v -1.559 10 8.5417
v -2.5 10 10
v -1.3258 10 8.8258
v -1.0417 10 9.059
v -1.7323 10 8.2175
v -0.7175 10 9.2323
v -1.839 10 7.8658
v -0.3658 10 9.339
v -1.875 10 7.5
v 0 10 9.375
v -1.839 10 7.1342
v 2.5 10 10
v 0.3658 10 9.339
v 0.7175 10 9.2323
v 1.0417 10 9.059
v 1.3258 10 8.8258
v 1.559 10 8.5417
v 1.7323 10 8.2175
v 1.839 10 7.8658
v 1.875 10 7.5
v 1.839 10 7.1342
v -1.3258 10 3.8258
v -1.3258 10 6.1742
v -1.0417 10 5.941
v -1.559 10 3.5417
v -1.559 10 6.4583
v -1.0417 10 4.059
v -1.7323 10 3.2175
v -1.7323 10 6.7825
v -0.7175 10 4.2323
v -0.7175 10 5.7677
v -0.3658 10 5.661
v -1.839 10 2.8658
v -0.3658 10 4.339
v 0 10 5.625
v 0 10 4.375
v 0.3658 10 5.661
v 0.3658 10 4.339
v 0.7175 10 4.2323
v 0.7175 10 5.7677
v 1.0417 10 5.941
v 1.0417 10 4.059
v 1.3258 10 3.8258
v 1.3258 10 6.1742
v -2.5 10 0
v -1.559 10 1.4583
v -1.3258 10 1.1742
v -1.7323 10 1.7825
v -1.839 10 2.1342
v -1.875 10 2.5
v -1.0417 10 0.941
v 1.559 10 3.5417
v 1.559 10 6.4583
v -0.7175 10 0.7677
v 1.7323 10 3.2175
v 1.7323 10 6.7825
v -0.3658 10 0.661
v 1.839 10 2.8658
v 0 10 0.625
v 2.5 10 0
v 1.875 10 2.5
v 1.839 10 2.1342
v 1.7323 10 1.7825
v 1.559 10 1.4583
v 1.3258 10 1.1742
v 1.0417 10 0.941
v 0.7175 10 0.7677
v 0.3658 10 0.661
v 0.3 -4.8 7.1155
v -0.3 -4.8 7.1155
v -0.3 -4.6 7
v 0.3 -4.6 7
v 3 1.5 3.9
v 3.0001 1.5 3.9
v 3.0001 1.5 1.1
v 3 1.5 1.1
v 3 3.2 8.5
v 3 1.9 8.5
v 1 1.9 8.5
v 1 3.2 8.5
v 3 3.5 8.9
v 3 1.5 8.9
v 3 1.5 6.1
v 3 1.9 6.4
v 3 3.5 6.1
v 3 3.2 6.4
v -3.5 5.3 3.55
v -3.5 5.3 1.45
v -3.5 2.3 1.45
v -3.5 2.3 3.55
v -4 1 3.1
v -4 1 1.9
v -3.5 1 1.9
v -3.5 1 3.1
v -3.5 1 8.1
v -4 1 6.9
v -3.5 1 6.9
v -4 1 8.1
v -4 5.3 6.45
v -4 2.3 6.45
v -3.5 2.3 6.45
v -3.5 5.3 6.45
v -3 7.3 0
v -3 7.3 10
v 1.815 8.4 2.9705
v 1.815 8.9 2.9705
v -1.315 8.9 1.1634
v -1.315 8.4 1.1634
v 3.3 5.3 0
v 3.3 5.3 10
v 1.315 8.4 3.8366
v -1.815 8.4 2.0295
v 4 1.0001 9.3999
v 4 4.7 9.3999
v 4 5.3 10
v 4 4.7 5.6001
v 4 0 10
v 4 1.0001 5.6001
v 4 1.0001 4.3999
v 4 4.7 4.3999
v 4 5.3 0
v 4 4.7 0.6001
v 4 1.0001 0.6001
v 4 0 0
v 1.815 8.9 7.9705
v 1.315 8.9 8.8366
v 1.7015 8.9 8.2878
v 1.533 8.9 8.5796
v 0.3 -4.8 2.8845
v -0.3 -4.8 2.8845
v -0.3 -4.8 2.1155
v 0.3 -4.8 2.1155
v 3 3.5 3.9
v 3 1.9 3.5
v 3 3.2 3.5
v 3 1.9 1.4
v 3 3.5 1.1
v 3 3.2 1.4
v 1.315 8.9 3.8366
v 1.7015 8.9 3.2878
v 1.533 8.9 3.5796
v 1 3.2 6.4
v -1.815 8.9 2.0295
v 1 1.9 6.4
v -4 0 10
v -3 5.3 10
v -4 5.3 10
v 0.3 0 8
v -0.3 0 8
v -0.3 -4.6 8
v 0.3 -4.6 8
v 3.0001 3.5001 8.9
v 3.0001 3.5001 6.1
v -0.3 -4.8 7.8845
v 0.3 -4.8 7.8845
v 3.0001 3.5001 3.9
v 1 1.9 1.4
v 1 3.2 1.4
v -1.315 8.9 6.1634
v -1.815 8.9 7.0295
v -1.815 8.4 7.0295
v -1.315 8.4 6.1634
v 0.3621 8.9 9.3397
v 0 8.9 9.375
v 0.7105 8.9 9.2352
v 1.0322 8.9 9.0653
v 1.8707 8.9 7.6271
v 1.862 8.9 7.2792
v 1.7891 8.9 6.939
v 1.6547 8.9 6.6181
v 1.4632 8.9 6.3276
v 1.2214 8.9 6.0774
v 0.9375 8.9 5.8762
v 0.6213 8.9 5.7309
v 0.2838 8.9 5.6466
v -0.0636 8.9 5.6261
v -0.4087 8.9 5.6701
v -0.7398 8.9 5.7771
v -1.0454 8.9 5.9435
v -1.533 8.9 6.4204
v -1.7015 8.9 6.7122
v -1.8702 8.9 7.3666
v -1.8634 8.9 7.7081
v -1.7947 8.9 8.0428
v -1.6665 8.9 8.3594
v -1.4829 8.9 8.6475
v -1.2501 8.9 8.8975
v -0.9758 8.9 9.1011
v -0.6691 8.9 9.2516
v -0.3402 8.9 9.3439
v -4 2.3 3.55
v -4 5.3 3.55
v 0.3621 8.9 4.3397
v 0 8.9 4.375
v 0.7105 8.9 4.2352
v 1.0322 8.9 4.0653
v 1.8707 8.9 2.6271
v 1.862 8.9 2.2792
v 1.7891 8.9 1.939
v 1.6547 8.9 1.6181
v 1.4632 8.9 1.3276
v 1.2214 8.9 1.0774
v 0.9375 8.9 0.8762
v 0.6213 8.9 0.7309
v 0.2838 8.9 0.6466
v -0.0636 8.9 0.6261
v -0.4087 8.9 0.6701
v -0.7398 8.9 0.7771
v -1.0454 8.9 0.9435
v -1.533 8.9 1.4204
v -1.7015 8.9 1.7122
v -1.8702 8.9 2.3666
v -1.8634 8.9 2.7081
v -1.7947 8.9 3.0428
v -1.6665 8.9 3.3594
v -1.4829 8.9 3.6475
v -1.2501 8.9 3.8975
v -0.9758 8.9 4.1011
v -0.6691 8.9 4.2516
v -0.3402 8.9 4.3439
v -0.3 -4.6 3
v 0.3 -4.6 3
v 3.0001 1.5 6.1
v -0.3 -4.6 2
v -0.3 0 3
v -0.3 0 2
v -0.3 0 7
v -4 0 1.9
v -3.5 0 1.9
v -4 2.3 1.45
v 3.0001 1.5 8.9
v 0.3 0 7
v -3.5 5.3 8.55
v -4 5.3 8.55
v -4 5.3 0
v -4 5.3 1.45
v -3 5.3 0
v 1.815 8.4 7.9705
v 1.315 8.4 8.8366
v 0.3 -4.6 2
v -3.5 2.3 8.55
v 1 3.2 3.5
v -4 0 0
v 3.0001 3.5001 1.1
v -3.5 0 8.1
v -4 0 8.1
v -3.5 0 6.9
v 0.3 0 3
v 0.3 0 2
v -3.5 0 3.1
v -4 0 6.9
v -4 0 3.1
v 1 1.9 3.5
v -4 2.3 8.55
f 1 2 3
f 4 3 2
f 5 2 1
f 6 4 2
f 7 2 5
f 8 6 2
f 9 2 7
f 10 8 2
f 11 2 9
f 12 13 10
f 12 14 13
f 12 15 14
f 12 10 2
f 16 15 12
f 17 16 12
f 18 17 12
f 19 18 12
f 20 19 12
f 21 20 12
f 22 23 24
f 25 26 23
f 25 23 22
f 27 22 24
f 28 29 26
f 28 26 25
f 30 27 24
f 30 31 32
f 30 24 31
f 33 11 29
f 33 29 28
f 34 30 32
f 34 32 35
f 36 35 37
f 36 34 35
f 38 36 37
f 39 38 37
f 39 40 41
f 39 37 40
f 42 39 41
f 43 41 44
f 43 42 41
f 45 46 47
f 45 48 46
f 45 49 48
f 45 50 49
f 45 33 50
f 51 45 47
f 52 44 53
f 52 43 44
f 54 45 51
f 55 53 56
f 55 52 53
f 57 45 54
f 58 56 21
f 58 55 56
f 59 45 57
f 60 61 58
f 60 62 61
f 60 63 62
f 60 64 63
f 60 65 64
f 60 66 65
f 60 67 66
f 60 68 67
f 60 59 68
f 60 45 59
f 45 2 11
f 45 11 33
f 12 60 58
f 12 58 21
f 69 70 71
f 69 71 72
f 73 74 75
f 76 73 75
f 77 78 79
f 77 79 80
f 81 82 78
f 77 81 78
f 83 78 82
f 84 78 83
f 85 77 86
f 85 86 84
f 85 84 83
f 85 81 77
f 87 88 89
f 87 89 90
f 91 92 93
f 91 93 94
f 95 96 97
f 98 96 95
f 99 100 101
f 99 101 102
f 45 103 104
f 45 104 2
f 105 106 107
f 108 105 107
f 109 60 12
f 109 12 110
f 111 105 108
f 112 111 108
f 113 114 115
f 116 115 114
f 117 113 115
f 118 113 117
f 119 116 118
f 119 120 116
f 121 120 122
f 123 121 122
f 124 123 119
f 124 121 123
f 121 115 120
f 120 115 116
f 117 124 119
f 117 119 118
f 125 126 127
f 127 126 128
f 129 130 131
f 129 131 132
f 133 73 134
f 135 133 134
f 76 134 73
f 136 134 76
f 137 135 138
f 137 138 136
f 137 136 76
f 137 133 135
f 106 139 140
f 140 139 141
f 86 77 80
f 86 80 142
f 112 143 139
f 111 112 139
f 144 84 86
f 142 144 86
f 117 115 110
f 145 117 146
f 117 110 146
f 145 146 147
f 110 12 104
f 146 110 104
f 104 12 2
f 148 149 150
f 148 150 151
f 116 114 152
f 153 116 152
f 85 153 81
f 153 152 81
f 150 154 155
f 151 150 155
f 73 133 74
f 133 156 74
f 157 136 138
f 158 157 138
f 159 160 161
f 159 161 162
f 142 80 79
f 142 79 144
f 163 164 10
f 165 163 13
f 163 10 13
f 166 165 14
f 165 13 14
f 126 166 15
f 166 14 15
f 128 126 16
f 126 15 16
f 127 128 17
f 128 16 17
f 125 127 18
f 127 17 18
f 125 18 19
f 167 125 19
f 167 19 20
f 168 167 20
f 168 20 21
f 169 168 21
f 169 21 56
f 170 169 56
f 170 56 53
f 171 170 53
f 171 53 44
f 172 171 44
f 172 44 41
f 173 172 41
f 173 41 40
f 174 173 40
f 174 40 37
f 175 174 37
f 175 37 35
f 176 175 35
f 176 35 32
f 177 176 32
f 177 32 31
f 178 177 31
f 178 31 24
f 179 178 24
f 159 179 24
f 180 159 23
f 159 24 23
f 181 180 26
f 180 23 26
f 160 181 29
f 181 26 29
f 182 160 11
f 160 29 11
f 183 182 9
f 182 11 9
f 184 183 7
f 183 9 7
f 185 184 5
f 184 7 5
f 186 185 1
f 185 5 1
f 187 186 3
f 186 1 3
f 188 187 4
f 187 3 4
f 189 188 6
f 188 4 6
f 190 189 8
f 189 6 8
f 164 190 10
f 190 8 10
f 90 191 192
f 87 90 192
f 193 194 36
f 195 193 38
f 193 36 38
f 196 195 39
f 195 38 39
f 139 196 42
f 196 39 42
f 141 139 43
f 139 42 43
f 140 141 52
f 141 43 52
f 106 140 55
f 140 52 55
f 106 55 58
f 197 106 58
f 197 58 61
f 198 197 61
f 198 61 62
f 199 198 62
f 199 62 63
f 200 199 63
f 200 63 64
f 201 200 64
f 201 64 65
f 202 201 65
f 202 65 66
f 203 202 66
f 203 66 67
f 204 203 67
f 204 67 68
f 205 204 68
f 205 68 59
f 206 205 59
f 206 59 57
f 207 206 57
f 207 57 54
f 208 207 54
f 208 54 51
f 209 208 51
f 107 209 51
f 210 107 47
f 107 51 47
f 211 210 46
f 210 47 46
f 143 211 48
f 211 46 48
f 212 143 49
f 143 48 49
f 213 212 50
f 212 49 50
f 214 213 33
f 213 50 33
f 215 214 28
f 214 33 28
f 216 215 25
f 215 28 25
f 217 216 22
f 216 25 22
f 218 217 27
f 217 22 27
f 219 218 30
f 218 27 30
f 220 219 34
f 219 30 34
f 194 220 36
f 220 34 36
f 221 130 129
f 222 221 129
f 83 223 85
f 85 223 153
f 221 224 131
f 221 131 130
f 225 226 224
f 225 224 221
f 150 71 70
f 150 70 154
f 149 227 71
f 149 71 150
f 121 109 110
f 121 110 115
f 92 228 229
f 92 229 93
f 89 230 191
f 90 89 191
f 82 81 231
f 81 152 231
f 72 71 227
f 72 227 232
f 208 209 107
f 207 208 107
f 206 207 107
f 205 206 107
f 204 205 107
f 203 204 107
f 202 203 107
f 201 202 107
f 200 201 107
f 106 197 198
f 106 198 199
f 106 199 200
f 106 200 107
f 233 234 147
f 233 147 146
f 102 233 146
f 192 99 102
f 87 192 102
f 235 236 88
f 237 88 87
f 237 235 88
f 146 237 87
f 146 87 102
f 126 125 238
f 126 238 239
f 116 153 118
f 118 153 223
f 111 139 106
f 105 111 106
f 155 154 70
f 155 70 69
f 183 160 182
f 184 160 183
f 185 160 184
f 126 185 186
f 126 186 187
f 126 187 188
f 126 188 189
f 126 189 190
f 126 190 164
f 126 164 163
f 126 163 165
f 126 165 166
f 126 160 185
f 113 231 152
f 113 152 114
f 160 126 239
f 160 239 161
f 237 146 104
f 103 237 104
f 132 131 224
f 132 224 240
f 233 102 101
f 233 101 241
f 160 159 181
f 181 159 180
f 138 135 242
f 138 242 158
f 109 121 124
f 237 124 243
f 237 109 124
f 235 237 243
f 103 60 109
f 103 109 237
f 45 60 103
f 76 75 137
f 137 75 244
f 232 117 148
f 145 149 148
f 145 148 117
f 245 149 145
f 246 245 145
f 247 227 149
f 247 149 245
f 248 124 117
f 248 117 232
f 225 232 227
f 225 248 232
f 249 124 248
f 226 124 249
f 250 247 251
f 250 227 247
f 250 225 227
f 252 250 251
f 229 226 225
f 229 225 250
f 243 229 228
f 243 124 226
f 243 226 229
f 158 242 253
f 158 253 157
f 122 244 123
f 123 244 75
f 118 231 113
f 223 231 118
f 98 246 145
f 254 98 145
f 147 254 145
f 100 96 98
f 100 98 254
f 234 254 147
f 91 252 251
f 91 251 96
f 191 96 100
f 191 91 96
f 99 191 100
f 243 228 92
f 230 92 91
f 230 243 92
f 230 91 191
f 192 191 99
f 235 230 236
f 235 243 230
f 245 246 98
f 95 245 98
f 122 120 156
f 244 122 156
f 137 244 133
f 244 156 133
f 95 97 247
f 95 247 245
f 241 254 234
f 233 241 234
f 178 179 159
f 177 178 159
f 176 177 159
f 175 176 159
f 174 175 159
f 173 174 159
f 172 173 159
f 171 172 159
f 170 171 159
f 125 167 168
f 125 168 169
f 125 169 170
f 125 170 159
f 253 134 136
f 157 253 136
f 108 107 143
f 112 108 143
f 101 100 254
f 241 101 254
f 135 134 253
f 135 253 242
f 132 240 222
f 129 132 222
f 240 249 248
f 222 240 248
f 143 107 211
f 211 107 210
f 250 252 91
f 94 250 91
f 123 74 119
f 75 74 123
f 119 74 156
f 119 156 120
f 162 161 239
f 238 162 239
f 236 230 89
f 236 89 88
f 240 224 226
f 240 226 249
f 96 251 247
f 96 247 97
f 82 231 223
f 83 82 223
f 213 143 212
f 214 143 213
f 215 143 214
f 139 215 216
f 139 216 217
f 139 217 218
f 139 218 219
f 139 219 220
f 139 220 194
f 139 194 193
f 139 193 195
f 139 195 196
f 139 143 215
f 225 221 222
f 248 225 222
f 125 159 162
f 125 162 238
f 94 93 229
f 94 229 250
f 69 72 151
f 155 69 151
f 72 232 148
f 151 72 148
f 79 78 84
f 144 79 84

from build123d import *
from OCP.BRepFilletAPI import BRepFilletAPI_MakeChamfer

# Parameters (mm, degrees)
Z_KLAD_PROTA_EN_DEPTH    = 10
SKICA2_R                 = 1.875
ODEBR_N_PROTA_EN_1_DEPTH = 1.1
ODEBR_N_PROTA_EN_2_DEPTH = 0.5
SKICA4_W                 = 2.1
SKICA4_H                 = 3
SKICA4_W_2               = 1.2
SKICA4_H_2               = 1
ODEBR_N_PROTA_EN_3_DEPTH = 0.5
SKICA5_W                 = 2.8
SKICA5_H                 = 2
ODEBR_N_PROTA_EN_4_DEPTH = 1
LINE_RN_POLE1_COUNT      = 3
LINE_RN_POLE1_PITCH      = 5
ZKOSEN_1_SIZE            = 1.2
ZKOSEN_1_SIZE_2          = 1
ZKOSEN_2_SIZE            = 0.5
ZKOSEN_2_SIZE_2          = 1
SKICA6_W                 = 2.1
SKICA6_H                 = 1.3
ODEBR_N_PROTA_EN_5_DEPTH = 2
LINE_RN_POLE2_COUNT      = 3
LINE_RN_POLE2_PITCH      = 5
SKICA7_W                 = 0.6
SKICA7_H                 = 1
P_ID_N_PROTA_EN_1_DEPTH  = 4.8
LINE_RN_POLE3_COUNT      = 2
LINE_RN_POLE3_PITCH      = 5
ZKOSEN_3_SIZE            = 0.2
ZKOSEN_3_SIZE2           = 0.115470054


# Some blends are built 0.0001 mm under size
with BuildPart() as part:
    # Skica1 → Základ-Protažení (new body)
    with BuildSketch(Plane.XY):
        Polygon((-2.5, 10), (2.5, 10), (3.3, 5.3), (4, 5.3), (4, 0), (-4, 0), (-4, 5.3), (-3, 5.3), (-3, 7.3), align=None)
    extrude(amount=Z_KLAD_PROTA_EN_DEPTH)

    # Skica2 → Odebrání-Protažení1 (cut)
    with BuildSketch(Plane(origin=(0, 10, 0), x_dir=(-1, 0, 0), z_dir=(0, 1, 0))):
        with Locations(Location((0, 2.5, 0), (0, 0, 90))):
            Circle(SKICA2_R)
        with Locations(Location((0, 7.5, 0), (0, 0, 90))):
            Circle(SKICA2_R)
    extrude(amount=-ODEBR_N_PROTA_EN_1_DEPTH, mode=Mode.SUBTRACT)

    # Skica3 → Odebrání-Protažení2 (cut)
    with BuildSketch(Plane(origin=(0, 8.9, 0), x_dir=(-1, 0, 0), z_dir=(0, 1, 0))):
        Polygon((1.814998003, 2.029460683), (-1.314998003, 3.83656472), (-1.814998003, 2.970539317), (1.314998003, 1.16343528), align=None)
        Polygon((-1.314998003, 8.83656472), (1.814998003, 7.029460683), (1.314998003, 6.16343528), (-1.814998003, 7.970539317), align=None)
    extrude(amount=-ODEBR_N_PROTA_EN_2_DEPTH, mode=Mode.SUBTRACT)

    # Skica4 → Odebrání-Protažení3 (cut)
    with BuildSketch(Plane.ZY.offset(4)):
        with Locations((7.5, 3.8)):
            Rectangle(SKICA4_W, SKICA4_H)
        with Locations((7.5, 0.5)):
            Rectangle(SKICA4_W_2, SKICA4_H_2)
        with Locations((2.5, 3.8)):
            Rectangle(SKICA4_W, SKICA4_H)
        with Locations((2.5, 0.5)):
            Rectangle(SKICA4_W_2, SKICA4_H_2)
        with Locations((-2.5, 3.8)):
            Rectangle(SKICA4_W, SKICA4_H)
        with Locations((-2.5, 0.5)):
            Rectangle(SKICA4_W_2, SKICA4_H_2)
    extrude(amount=-ODEBR_N_PROTA_EN_3_DEPTH, mode=Mode.SUBTRACT)

    # Skica5 → Odebrání-Protažení4 (cut)
    with BuildSketch(Plane(origin=(4, 0, 0), x_dir=(0, 0, -1), z_dir=(1, 0, 0))):
        with Locations((-7.5, 2.5)):
            Rectangle(SKICA5_W, SKICA5_H)
    odebr_n_prota_en_4 = extrude(amount=-ODEBR_N_PROTA_EN_4_DEPTH, mode=Mode.SUBTRACT)

    # Lineární Pole1: Odebrání-Protažení4 ×3
    with Locations(*[(0, 0, -i * LINE_RN_POLE1_PITCH) for i in range(1, LINE_RN_POLE1_COUNT)]):
        add(odebr_n_prota_en_4, mode=Mode.SUBTRACT)

    # Zkosení1
    # the kernel refuses this chamfer: 1.2, 1 mm, written as the material it adds along each edge
    # the kernel refuses this chamfer: 1.2, 1 mm, written as the material it takes off along each edge
    with BuildSketch(Plane(origin=(4, 3.5, 8.9), x_dir=(0.024836286378920516, 0.9996915318631564, 0), z_dir=(0, 0, -1)), Plane(origin=(4, 3.5, 3.9), x_dir=(0.024836286378920516, 0.9996915318631564, 0), z_dir=(0, 0, -1))) as zkosen_1_2_piece_1:
        Polygon((ZKOSEN_1_SIZE * 0.999691531863, -ZKOSEN_1_SIZE * 0.0248362863789), (-ZKOSEN_1_SIZE_2 * 0.0248362863789, -ZKOSEN_1_SIZE_2 * 0.999691531863), (0, 0), align=None)
    extrude(amount=2.8, mode=Mode.SUBTRACT)
    with BuildSketch(Plane(origin=(4, 3.5, 11.993140689), x_dir=(0.024836286378920505, 0.9996915318631564, 0), z_dir=(0, 0, -1))) as zkosen_1_2_piece_2_section:
        Polygon((ZKOSEN_1_SIZE * 0.999691531863, -ZKOSEN_1_SIZE * 0.0248362863789), (-ZKOSEN_1_SIZE_2 * 0.0248362863789, -ZKOSEN_1_SIZE_2 * 0.999691531863), (0, 0), align=None)
    zkosen_1_2_piece_2 = extrude(amount=8.986281378, mode=Mode.PRIVATE)
    zkosen_1_2_piece_2 = split(zkosen_1_2_piece_2, bisect_by=Plane(origin=(3.666666667, 3.9, 3.9), z_dir=(0, 0, -1)), keep=Keep.TOP, mode=Mode.PRIVATE)
    add(zkosen_1_2_piece_2, mode=Mode.SUBTRACT)
    with BuildSketch(Plane(origin=(4, 3.5, 6.993140689), x_dir=(0.024836286378920505, 0.9996915318631564, 0), z_dir=(0, 0, -1))) as zkosen_1_2_piece_3_section:
        Polygon((ZKOSEN_1_SIZE * 0.999691531863, -ZKOSEN_1_SIZE * 0.0248362863789), (-ZKOSEN_1_SIZE_2 * 0.0248362863789, -ZKOSEN_1_SIZE_2 * 0.999691531863), (0, 0), align=None)
    zkosen_1_2_piece_3 = extrude(amount=8.986281378, mode=Mode.PRIVATE)
    zkosen_1_2_piece_3 = split(zkosen_1_2_piece_3, bisect_by=Plane(origin=(3.666666667, 3.9, 6.1), z_dir=(0, 0, 1)), keep=Keep.TOP, mode=Mode.PRIVATE)
    add(zkosen_1_2_piece_3, mode=Mode.SUBTRACT)

    # Zkosení2
    zkosen_2_edges_1 = [part.edges().sort_by_distance(p)[0] for p in [
        (4, 3.1, 8.9),
    ]]
    zkosen_2_side_1 = [part.faces().sort_by_distance(p)[0] for p in [
        (4, 3.1, 8.91),
    ]]
    zkosen_2_edges_2 = [part.edges().sort_by_distance(p)[0] for p in [
        (4, 1.5, 7.5),
    ]]
    zkosen_2_side_2 = [part.faces().sort_by_distance(p)[0] for p in [
        (4, 1.49, 7.5),
    ]]
    zkosen_2_edges_3 = [part.edges().sort_by_distance(p)[0] for p in [
        (4, 3.1, 6.1),
    ]]
    zkosen_2_side_3 = [part.faces().sort_by_distance(p)[0] for p in [
        (4, 3.1, 6.09),
    ]]
    zkosen_2_edges_4 = [part.edges().sort_by_distance(p)[0] for p in [
        (4, 3.1, 3.9),
    ]]
    zkosen_2_side_4 = [part.faces().sort_by_distance(p)[0] for p in [
        (4, 3.1, 3.91),
    ]]
    zkosen_2_edges_5 = [part.edges().sort_by_distance(p)[0] for p in [
        (4, 1.5, 2.5),
    ]]
    zkosen_2_side_5 = [part.faces().sort_by_distance(p)[0] for p in [
        (4, 1.49, 2.5),
    ]]
    zkosen_2_edges_6 = [part.edges().sort_by_distance(p)[0] for p in [
        (4, 3.1, 1.1),
    ]]
    zkosen_2_side_6 = [part.faces().sort_by_distance(p)[0] for p in [
        (4, 3.1, 1.09),
    ]]
    zkosen_2 = BRepFilletAPI_MakeChamfer(part.part.solid().wrapped)
    for e in zkosen_2_edges_1:
        zkosen_2.Add(ZKOSEN_2_SIZE - 0.0001, ZKOSEN_2_SIZE_2 - 0.0001, e.wrapped, zkosen_2_side_1[0].wrapped)
    for e in zkosen_2_edges_2:
        zkosen_2.Add(ZKOSEN_2_SIZE - 0.0001, ZKOSEN_2_SIZE_2 - 0.0001, e.wrapped, zkosen_2_side_2[0].wrapped)
    for e in zkosen_2_edges_3:
        zkosen_2.Add(ZKOSEN_2_SIZE - 0.0001, ZKOSEN_2_SIZE_2 - 0.0001, e.wrapped, zkosen_2_side_3[0].wrapped)
    for e in zkosen_2_edges_4:
        zkosen_2.Add(ZKOSEN_2_SIZE - 0.0001, ZKOSEN_2_SIZE_2 - 0.0001, e.wrapped, zkosen_2_side_4[0].wrapped)
    for e in zkosen_2_edges_5:
        zkosen_2.Add(ZKOSEN_2_SIZE - 0.0001, ZKOSEN_2_SIZE_2 - 0.0001, e.wrapped, zkosen_2_side_5[0].wrapped)
    for e in zkosen_2_edges_6:
        zkosen_2.Add(ZKOSEN_2_SIZE - 0.0001, ZKOSEN_2_SIZE_2 - 0.0001, e.wrapped, zkosen_2_side_6[0].wrapped)
    add(Compound.cast(zkosen_2.Shape()), mode=Mode.REPLACE)  # a hair under: the kernel refuses the full size

    # Skica6 → Odebrání-Protažení5 (cut)
    with BuildSketch(Plane(origin=(3, 0, 0), x_dir=(0, 0, -1), z_dir=(1, 0, 0))):
        with Locations((-7.45, 2.55)):
            Rectangle(SKICA6_W, SKICA6_H)
    odebr_n_prota_en_5 = extrude(amount=-ODEBR_N_PROTA_EN_5_DEPTH, mode=Mode.SUBTRACT)

    # Lineární Pole2: Odebrání-Protažení5 ×3
    with Locations(*[(0, 0, -i * LINE_RN_POLE2_PITCH) for i in range(1, LINE_RN_POLE2_COUNT)]):
        add(odebr_n_prota_en_5, mode=Mode.SUBTRACT)

    # Skica7 → Přidání-Protažení1 (add)
    with BuildSketch(Plane.XZ):
        with Locations((0, 2.5)):
            Rectangle(SKICA7_W, SKICA7_H)
    p_id_n_prota_en_1 = extrude(amount=P_ID_N_PROTA_EN_1_DEPTH)

    # Lineární Pole3: Přidání-Protažení1 ×2
    with Locations(*[(0, 0, i * LINE_RN_POLE3_PITCH) for i in range(1, LINE_RN_POLE3_COUNT)]):
        add(p_id_n_prota_en_1)

    # Zkosení3: one chamfer whose edges measure the first distance from different faces: ONE call of the kernel's chamfer builder (chamfer() names one face for all edges)
    zkosen_3_edges_1 = [part.edges().sort_by_distance(p)[0] for p in [
        (0, -4.8, 2),
    ]]
    zkosen_3_side_1 = [part.faces().sort_by_distance(p)[0] for p in [
        (0, -2.4, 2),
    ]]
    zkosen_3_edges_2 = [part.edges().sort_by_distance(p)[0] for p in [
        (0, -4.8, 3),
    ]]
    zkosen_3_side_2 = [part.faces().sort_by_distance(p)[0] for p in [
        (0, -2.4, 3),
    ]]
    zkosen_3_edges_3 = [part.edges().sort_by_distance(p)[0] for p in [
        (0, -4.8, 7),
    ]]
    zkosen_3_side_3 = [part.faces().sort_by_distance(p)[0] for p in [
        (0, -2.4, 7),
    ]]
    zkosen_3_edges_4 = [part.edges().sort_by_distance(p)[0] for p in [
        (0, -4.8, 8),
    ]]
    zkosen_3_side_4 = [part.faces().sort_by_distance(p)[0] for p in [
        (0, -2.4, 8),
    ]]
    zkosen_3 = BRepFilletAPI_MakeChamfer(part.part.solid().wrapped)
    for e in zkosen_3_edges_1:
        zkosen_3.Add(ZKOSEN_3_SIZE, ZKOSEN_3_SIZE2, e.wrapped, zkosen_3_side_1[0].wrapped)  # the first distance lies on this face
    for e in zkosen_3_edges_2:
        zkosen_3.Add(ZKOSEN_3_SIZE, ZKOSEN_3_SIZE2, e.wrapped, zkosen_3_side_2[0].wrapped)  # the first distance lies on this face
    for e in zkosen_3_edges_3:
        zkosen_3.Add(ZKOSEN_3_SIZE, ZKOSEN_3_SIZE2, e.wrapped, zkosen_3_side_3[0].wrapped)  # the first distance lies on this face
    for e in zkosen_3_edges_4:
        zkosen_3.Add(ZKOSEN_3_SIZE, ZKOSEN_3_SIZE2, e.wrapped, zkosen_3_side_4[0].wrapped)  # the first distance lies on this face
    add(Compound.cast(zkosen_3.Shape()), mode=Mode.REPLACE)


solid = part.part
